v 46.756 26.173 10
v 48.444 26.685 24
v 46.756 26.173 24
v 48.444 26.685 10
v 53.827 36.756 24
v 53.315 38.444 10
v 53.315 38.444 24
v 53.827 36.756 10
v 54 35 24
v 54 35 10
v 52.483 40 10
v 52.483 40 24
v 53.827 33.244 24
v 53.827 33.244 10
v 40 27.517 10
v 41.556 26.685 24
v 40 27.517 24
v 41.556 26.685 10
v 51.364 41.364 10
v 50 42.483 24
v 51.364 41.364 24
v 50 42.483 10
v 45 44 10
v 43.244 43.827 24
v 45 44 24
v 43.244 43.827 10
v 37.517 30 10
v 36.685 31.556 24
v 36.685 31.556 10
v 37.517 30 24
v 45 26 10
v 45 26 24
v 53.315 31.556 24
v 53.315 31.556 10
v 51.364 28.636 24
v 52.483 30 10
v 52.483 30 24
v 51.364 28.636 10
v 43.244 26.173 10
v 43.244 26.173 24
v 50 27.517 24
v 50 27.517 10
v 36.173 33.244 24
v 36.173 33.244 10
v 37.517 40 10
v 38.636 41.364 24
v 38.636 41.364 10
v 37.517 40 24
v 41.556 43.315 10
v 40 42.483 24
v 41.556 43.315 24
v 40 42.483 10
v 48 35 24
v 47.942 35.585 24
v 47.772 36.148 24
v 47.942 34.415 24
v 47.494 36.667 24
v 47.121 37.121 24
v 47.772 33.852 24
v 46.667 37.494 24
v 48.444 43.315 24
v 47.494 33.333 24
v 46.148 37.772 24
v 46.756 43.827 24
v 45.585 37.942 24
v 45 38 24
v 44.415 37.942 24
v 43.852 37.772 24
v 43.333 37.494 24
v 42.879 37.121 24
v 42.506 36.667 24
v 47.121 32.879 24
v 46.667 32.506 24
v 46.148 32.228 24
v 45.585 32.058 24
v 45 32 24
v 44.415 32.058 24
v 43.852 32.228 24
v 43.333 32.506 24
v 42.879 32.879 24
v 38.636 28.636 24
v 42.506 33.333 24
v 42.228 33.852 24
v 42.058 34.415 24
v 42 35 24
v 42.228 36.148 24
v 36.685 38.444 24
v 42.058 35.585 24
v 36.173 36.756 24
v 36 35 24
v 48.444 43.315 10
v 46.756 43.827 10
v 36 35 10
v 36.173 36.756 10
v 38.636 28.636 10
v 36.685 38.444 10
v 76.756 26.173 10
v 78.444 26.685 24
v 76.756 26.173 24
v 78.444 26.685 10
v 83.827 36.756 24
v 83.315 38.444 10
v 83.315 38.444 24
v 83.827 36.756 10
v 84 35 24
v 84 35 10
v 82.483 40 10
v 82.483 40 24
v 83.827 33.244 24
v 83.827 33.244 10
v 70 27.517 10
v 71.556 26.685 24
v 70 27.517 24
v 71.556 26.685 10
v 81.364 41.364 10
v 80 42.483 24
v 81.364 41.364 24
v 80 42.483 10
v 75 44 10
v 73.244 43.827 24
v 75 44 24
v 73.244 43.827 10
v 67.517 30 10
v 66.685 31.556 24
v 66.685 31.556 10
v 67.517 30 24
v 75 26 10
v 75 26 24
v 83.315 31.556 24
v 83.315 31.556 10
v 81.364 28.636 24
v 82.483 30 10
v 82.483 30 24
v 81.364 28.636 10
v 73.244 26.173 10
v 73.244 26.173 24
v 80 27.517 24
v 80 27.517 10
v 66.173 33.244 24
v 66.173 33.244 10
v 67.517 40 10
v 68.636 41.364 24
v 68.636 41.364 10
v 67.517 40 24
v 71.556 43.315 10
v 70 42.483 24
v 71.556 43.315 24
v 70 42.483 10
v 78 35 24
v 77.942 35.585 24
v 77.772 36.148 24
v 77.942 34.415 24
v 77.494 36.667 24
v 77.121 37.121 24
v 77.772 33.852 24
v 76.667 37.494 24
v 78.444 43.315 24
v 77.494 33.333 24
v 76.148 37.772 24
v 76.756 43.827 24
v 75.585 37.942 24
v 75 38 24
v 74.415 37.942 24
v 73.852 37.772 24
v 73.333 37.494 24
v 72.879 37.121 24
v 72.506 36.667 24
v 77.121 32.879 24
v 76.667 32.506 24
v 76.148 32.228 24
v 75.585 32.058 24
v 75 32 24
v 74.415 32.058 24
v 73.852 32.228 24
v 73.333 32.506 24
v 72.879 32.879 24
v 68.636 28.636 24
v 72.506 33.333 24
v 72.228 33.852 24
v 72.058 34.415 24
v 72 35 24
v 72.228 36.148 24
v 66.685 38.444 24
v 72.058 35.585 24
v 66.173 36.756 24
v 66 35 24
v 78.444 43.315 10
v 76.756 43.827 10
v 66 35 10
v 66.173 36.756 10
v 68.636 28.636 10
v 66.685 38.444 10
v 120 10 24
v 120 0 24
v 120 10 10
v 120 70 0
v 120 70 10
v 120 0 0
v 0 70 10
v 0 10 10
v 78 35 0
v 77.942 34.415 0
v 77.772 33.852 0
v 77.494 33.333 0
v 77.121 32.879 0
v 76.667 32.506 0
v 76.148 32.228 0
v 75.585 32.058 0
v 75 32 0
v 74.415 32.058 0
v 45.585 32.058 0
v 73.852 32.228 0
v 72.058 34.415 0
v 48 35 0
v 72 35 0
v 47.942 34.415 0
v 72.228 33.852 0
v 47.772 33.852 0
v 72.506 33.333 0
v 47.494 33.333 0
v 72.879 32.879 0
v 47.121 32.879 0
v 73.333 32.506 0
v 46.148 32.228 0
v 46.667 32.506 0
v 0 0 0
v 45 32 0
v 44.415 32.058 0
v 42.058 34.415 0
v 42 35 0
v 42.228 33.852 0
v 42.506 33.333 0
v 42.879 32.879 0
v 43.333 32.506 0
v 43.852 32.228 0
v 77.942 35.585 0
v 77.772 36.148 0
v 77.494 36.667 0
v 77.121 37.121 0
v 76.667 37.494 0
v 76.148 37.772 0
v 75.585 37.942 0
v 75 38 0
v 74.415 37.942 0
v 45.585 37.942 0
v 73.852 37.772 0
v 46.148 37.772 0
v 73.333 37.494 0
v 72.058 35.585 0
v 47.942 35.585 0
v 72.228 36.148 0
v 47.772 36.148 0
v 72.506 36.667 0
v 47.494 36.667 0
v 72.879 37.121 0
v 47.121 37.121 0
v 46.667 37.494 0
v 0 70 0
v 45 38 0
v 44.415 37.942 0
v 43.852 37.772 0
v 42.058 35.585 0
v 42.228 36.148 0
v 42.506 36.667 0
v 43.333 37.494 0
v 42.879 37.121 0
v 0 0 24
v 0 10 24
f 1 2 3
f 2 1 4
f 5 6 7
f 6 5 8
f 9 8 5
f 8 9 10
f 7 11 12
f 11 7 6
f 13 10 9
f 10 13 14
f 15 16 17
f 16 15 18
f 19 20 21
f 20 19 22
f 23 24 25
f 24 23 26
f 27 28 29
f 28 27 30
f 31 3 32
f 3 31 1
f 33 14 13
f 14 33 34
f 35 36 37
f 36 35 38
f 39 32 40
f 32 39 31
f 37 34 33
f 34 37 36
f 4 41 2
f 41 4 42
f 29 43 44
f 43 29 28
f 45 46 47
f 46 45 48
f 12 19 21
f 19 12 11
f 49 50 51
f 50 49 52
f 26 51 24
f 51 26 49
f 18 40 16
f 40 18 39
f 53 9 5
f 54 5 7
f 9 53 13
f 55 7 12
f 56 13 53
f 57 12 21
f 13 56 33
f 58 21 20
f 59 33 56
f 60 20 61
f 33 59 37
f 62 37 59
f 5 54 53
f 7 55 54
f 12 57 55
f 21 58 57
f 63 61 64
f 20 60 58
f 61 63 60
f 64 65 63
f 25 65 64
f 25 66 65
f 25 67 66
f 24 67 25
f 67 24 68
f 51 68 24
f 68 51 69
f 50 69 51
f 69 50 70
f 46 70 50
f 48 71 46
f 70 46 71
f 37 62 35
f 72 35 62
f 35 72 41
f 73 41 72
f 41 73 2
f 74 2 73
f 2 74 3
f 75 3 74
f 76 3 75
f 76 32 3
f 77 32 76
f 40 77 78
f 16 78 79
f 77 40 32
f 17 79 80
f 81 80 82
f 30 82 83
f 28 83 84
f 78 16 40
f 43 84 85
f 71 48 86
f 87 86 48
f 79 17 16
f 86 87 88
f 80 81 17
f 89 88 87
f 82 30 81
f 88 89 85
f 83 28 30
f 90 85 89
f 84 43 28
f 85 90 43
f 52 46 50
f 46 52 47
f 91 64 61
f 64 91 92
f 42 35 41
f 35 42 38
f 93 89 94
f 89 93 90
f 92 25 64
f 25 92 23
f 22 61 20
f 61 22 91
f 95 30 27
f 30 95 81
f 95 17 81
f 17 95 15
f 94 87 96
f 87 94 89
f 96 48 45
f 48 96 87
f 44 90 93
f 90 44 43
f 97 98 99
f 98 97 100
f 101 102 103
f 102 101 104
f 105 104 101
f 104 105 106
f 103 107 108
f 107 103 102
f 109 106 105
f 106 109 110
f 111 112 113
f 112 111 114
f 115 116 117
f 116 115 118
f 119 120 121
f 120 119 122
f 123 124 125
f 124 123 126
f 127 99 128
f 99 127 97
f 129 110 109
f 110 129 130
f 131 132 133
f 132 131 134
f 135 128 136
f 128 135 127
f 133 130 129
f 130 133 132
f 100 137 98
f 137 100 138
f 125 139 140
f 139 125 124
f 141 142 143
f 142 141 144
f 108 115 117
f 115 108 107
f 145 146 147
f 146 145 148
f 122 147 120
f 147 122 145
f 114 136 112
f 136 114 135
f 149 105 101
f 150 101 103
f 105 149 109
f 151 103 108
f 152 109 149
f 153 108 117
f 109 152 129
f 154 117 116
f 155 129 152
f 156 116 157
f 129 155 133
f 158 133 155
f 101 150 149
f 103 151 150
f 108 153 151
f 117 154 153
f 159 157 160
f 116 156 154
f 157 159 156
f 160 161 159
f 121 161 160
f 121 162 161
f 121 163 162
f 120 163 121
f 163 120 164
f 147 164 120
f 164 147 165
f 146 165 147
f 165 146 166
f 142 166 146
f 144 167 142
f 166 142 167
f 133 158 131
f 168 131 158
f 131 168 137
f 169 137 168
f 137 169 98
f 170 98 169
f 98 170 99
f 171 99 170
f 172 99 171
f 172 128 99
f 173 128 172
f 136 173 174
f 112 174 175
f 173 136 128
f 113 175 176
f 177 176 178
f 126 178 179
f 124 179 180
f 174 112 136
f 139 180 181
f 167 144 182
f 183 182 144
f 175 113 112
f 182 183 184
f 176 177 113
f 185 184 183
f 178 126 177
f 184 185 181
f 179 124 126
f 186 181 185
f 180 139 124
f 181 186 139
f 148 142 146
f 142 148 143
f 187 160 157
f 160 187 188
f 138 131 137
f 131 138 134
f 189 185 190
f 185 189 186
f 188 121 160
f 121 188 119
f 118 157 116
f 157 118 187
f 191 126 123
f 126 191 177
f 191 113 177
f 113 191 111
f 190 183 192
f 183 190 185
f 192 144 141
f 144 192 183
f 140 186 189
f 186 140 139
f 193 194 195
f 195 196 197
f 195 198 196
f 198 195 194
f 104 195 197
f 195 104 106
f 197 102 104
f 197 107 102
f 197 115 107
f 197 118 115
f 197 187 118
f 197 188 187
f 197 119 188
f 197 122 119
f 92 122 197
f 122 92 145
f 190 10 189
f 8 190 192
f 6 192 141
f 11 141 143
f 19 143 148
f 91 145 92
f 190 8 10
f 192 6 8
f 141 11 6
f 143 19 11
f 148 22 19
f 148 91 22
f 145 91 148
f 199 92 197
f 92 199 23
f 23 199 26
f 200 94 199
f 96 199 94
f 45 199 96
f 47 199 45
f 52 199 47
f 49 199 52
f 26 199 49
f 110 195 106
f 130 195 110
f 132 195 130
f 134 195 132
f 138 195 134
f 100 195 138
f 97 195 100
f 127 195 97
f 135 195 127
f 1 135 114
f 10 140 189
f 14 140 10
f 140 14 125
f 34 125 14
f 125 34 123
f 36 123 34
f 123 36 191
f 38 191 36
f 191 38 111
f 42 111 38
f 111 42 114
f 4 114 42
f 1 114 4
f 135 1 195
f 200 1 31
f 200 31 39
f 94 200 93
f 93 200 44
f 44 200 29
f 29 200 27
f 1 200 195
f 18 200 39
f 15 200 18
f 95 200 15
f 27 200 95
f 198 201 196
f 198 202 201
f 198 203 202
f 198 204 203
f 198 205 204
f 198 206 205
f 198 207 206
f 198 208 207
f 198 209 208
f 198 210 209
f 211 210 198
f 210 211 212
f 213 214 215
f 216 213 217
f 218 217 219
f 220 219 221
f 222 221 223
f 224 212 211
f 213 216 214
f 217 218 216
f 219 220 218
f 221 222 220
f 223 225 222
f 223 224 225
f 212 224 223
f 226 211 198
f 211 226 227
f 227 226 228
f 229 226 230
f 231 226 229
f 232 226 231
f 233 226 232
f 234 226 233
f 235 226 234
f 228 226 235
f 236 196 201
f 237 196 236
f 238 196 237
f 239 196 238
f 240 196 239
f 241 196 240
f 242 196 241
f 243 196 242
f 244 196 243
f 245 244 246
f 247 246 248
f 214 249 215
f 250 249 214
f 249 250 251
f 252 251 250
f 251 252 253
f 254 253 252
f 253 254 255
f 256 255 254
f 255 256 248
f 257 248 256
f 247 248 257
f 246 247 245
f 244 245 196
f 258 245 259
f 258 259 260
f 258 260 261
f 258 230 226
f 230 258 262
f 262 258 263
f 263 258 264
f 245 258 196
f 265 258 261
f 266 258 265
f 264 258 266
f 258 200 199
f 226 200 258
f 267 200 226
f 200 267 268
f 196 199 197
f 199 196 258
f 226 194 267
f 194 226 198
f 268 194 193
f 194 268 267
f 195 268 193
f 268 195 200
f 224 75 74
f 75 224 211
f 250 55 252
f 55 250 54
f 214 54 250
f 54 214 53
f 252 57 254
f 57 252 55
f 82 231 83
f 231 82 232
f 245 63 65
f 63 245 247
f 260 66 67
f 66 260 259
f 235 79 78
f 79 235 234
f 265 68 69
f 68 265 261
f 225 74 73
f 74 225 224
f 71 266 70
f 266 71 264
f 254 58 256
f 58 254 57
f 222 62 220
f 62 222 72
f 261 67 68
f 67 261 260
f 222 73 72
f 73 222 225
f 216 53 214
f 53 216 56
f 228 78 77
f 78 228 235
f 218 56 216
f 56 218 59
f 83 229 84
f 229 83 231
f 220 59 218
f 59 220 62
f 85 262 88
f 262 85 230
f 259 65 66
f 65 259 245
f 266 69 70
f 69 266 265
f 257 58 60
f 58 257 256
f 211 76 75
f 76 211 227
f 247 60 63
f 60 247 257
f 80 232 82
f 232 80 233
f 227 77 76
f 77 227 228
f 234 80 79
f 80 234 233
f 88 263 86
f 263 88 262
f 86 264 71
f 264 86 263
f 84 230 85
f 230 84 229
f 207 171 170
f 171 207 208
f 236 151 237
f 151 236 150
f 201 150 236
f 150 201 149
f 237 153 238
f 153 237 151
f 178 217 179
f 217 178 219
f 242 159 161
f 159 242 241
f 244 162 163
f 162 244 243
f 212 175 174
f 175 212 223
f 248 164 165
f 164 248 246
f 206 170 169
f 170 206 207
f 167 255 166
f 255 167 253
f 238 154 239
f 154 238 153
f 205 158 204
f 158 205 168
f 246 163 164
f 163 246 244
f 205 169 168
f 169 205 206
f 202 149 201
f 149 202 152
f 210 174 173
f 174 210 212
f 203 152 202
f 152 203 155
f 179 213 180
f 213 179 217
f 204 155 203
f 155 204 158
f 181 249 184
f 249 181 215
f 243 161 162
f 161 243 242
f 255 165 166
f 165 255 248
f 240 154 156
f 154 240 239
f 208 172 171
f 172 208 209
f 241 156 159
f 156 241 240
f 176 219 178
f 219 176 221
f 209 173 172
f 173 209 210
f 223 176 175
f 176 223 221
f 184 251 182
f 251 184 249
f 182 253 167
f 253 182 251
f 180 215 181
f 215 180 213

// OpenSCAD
$fn = 32;

// ----------------------------------------------------------------------
// Drill jig: fence jig
// ----------------------------------------------------------------------

// --- parameters (mm) ---
plate_l = 120;            // plate length, X
plate_w = 70;             // plate width, Y
plate_t = 10;             // plate thickness
boss_d = 18;              // guide boss diameter
boss_h = 15;              // boss height above the plate
guide_d = 6;              // guide hole diameter
boss_pitch = 30;          // boss pitch
fence_h = 15;             // fence height above the plate
fence_t = 10;             // fence thickness

n_boss = 2;  // guide bosses
boss_x0 = (plate_l - (n_boss - 1) * boss_pitch) / 2;  // first boss X
boss_top = plate_t - 1 + boss_h;  // boss crown height
fence_top = plate_t - 1 + fence_h;  // fence crown height
total_h = max([fence_top, boss_top]);  // overall height

difference() {
  union() {
  cube([plate_l, plate_w, plate_t]);
  for (i = [0 : n_boss - 1])
    translate([boss_x0 + i * boss_pitch, plate_w / 2, plate_t - 1])
      cylinder(h = boss_h, d = boss_d);
  translate([0, 0, plate_t - 1]) cube([plate_l, fence_t, fence_h]);
  }
  for (i = [0 : n_boss - 1])
    translate([boss_x0 + i * boss_pitch, plate_w / 2, -1])
      cylinder(h = plate_t + boss_h, d = guide_d);
}
